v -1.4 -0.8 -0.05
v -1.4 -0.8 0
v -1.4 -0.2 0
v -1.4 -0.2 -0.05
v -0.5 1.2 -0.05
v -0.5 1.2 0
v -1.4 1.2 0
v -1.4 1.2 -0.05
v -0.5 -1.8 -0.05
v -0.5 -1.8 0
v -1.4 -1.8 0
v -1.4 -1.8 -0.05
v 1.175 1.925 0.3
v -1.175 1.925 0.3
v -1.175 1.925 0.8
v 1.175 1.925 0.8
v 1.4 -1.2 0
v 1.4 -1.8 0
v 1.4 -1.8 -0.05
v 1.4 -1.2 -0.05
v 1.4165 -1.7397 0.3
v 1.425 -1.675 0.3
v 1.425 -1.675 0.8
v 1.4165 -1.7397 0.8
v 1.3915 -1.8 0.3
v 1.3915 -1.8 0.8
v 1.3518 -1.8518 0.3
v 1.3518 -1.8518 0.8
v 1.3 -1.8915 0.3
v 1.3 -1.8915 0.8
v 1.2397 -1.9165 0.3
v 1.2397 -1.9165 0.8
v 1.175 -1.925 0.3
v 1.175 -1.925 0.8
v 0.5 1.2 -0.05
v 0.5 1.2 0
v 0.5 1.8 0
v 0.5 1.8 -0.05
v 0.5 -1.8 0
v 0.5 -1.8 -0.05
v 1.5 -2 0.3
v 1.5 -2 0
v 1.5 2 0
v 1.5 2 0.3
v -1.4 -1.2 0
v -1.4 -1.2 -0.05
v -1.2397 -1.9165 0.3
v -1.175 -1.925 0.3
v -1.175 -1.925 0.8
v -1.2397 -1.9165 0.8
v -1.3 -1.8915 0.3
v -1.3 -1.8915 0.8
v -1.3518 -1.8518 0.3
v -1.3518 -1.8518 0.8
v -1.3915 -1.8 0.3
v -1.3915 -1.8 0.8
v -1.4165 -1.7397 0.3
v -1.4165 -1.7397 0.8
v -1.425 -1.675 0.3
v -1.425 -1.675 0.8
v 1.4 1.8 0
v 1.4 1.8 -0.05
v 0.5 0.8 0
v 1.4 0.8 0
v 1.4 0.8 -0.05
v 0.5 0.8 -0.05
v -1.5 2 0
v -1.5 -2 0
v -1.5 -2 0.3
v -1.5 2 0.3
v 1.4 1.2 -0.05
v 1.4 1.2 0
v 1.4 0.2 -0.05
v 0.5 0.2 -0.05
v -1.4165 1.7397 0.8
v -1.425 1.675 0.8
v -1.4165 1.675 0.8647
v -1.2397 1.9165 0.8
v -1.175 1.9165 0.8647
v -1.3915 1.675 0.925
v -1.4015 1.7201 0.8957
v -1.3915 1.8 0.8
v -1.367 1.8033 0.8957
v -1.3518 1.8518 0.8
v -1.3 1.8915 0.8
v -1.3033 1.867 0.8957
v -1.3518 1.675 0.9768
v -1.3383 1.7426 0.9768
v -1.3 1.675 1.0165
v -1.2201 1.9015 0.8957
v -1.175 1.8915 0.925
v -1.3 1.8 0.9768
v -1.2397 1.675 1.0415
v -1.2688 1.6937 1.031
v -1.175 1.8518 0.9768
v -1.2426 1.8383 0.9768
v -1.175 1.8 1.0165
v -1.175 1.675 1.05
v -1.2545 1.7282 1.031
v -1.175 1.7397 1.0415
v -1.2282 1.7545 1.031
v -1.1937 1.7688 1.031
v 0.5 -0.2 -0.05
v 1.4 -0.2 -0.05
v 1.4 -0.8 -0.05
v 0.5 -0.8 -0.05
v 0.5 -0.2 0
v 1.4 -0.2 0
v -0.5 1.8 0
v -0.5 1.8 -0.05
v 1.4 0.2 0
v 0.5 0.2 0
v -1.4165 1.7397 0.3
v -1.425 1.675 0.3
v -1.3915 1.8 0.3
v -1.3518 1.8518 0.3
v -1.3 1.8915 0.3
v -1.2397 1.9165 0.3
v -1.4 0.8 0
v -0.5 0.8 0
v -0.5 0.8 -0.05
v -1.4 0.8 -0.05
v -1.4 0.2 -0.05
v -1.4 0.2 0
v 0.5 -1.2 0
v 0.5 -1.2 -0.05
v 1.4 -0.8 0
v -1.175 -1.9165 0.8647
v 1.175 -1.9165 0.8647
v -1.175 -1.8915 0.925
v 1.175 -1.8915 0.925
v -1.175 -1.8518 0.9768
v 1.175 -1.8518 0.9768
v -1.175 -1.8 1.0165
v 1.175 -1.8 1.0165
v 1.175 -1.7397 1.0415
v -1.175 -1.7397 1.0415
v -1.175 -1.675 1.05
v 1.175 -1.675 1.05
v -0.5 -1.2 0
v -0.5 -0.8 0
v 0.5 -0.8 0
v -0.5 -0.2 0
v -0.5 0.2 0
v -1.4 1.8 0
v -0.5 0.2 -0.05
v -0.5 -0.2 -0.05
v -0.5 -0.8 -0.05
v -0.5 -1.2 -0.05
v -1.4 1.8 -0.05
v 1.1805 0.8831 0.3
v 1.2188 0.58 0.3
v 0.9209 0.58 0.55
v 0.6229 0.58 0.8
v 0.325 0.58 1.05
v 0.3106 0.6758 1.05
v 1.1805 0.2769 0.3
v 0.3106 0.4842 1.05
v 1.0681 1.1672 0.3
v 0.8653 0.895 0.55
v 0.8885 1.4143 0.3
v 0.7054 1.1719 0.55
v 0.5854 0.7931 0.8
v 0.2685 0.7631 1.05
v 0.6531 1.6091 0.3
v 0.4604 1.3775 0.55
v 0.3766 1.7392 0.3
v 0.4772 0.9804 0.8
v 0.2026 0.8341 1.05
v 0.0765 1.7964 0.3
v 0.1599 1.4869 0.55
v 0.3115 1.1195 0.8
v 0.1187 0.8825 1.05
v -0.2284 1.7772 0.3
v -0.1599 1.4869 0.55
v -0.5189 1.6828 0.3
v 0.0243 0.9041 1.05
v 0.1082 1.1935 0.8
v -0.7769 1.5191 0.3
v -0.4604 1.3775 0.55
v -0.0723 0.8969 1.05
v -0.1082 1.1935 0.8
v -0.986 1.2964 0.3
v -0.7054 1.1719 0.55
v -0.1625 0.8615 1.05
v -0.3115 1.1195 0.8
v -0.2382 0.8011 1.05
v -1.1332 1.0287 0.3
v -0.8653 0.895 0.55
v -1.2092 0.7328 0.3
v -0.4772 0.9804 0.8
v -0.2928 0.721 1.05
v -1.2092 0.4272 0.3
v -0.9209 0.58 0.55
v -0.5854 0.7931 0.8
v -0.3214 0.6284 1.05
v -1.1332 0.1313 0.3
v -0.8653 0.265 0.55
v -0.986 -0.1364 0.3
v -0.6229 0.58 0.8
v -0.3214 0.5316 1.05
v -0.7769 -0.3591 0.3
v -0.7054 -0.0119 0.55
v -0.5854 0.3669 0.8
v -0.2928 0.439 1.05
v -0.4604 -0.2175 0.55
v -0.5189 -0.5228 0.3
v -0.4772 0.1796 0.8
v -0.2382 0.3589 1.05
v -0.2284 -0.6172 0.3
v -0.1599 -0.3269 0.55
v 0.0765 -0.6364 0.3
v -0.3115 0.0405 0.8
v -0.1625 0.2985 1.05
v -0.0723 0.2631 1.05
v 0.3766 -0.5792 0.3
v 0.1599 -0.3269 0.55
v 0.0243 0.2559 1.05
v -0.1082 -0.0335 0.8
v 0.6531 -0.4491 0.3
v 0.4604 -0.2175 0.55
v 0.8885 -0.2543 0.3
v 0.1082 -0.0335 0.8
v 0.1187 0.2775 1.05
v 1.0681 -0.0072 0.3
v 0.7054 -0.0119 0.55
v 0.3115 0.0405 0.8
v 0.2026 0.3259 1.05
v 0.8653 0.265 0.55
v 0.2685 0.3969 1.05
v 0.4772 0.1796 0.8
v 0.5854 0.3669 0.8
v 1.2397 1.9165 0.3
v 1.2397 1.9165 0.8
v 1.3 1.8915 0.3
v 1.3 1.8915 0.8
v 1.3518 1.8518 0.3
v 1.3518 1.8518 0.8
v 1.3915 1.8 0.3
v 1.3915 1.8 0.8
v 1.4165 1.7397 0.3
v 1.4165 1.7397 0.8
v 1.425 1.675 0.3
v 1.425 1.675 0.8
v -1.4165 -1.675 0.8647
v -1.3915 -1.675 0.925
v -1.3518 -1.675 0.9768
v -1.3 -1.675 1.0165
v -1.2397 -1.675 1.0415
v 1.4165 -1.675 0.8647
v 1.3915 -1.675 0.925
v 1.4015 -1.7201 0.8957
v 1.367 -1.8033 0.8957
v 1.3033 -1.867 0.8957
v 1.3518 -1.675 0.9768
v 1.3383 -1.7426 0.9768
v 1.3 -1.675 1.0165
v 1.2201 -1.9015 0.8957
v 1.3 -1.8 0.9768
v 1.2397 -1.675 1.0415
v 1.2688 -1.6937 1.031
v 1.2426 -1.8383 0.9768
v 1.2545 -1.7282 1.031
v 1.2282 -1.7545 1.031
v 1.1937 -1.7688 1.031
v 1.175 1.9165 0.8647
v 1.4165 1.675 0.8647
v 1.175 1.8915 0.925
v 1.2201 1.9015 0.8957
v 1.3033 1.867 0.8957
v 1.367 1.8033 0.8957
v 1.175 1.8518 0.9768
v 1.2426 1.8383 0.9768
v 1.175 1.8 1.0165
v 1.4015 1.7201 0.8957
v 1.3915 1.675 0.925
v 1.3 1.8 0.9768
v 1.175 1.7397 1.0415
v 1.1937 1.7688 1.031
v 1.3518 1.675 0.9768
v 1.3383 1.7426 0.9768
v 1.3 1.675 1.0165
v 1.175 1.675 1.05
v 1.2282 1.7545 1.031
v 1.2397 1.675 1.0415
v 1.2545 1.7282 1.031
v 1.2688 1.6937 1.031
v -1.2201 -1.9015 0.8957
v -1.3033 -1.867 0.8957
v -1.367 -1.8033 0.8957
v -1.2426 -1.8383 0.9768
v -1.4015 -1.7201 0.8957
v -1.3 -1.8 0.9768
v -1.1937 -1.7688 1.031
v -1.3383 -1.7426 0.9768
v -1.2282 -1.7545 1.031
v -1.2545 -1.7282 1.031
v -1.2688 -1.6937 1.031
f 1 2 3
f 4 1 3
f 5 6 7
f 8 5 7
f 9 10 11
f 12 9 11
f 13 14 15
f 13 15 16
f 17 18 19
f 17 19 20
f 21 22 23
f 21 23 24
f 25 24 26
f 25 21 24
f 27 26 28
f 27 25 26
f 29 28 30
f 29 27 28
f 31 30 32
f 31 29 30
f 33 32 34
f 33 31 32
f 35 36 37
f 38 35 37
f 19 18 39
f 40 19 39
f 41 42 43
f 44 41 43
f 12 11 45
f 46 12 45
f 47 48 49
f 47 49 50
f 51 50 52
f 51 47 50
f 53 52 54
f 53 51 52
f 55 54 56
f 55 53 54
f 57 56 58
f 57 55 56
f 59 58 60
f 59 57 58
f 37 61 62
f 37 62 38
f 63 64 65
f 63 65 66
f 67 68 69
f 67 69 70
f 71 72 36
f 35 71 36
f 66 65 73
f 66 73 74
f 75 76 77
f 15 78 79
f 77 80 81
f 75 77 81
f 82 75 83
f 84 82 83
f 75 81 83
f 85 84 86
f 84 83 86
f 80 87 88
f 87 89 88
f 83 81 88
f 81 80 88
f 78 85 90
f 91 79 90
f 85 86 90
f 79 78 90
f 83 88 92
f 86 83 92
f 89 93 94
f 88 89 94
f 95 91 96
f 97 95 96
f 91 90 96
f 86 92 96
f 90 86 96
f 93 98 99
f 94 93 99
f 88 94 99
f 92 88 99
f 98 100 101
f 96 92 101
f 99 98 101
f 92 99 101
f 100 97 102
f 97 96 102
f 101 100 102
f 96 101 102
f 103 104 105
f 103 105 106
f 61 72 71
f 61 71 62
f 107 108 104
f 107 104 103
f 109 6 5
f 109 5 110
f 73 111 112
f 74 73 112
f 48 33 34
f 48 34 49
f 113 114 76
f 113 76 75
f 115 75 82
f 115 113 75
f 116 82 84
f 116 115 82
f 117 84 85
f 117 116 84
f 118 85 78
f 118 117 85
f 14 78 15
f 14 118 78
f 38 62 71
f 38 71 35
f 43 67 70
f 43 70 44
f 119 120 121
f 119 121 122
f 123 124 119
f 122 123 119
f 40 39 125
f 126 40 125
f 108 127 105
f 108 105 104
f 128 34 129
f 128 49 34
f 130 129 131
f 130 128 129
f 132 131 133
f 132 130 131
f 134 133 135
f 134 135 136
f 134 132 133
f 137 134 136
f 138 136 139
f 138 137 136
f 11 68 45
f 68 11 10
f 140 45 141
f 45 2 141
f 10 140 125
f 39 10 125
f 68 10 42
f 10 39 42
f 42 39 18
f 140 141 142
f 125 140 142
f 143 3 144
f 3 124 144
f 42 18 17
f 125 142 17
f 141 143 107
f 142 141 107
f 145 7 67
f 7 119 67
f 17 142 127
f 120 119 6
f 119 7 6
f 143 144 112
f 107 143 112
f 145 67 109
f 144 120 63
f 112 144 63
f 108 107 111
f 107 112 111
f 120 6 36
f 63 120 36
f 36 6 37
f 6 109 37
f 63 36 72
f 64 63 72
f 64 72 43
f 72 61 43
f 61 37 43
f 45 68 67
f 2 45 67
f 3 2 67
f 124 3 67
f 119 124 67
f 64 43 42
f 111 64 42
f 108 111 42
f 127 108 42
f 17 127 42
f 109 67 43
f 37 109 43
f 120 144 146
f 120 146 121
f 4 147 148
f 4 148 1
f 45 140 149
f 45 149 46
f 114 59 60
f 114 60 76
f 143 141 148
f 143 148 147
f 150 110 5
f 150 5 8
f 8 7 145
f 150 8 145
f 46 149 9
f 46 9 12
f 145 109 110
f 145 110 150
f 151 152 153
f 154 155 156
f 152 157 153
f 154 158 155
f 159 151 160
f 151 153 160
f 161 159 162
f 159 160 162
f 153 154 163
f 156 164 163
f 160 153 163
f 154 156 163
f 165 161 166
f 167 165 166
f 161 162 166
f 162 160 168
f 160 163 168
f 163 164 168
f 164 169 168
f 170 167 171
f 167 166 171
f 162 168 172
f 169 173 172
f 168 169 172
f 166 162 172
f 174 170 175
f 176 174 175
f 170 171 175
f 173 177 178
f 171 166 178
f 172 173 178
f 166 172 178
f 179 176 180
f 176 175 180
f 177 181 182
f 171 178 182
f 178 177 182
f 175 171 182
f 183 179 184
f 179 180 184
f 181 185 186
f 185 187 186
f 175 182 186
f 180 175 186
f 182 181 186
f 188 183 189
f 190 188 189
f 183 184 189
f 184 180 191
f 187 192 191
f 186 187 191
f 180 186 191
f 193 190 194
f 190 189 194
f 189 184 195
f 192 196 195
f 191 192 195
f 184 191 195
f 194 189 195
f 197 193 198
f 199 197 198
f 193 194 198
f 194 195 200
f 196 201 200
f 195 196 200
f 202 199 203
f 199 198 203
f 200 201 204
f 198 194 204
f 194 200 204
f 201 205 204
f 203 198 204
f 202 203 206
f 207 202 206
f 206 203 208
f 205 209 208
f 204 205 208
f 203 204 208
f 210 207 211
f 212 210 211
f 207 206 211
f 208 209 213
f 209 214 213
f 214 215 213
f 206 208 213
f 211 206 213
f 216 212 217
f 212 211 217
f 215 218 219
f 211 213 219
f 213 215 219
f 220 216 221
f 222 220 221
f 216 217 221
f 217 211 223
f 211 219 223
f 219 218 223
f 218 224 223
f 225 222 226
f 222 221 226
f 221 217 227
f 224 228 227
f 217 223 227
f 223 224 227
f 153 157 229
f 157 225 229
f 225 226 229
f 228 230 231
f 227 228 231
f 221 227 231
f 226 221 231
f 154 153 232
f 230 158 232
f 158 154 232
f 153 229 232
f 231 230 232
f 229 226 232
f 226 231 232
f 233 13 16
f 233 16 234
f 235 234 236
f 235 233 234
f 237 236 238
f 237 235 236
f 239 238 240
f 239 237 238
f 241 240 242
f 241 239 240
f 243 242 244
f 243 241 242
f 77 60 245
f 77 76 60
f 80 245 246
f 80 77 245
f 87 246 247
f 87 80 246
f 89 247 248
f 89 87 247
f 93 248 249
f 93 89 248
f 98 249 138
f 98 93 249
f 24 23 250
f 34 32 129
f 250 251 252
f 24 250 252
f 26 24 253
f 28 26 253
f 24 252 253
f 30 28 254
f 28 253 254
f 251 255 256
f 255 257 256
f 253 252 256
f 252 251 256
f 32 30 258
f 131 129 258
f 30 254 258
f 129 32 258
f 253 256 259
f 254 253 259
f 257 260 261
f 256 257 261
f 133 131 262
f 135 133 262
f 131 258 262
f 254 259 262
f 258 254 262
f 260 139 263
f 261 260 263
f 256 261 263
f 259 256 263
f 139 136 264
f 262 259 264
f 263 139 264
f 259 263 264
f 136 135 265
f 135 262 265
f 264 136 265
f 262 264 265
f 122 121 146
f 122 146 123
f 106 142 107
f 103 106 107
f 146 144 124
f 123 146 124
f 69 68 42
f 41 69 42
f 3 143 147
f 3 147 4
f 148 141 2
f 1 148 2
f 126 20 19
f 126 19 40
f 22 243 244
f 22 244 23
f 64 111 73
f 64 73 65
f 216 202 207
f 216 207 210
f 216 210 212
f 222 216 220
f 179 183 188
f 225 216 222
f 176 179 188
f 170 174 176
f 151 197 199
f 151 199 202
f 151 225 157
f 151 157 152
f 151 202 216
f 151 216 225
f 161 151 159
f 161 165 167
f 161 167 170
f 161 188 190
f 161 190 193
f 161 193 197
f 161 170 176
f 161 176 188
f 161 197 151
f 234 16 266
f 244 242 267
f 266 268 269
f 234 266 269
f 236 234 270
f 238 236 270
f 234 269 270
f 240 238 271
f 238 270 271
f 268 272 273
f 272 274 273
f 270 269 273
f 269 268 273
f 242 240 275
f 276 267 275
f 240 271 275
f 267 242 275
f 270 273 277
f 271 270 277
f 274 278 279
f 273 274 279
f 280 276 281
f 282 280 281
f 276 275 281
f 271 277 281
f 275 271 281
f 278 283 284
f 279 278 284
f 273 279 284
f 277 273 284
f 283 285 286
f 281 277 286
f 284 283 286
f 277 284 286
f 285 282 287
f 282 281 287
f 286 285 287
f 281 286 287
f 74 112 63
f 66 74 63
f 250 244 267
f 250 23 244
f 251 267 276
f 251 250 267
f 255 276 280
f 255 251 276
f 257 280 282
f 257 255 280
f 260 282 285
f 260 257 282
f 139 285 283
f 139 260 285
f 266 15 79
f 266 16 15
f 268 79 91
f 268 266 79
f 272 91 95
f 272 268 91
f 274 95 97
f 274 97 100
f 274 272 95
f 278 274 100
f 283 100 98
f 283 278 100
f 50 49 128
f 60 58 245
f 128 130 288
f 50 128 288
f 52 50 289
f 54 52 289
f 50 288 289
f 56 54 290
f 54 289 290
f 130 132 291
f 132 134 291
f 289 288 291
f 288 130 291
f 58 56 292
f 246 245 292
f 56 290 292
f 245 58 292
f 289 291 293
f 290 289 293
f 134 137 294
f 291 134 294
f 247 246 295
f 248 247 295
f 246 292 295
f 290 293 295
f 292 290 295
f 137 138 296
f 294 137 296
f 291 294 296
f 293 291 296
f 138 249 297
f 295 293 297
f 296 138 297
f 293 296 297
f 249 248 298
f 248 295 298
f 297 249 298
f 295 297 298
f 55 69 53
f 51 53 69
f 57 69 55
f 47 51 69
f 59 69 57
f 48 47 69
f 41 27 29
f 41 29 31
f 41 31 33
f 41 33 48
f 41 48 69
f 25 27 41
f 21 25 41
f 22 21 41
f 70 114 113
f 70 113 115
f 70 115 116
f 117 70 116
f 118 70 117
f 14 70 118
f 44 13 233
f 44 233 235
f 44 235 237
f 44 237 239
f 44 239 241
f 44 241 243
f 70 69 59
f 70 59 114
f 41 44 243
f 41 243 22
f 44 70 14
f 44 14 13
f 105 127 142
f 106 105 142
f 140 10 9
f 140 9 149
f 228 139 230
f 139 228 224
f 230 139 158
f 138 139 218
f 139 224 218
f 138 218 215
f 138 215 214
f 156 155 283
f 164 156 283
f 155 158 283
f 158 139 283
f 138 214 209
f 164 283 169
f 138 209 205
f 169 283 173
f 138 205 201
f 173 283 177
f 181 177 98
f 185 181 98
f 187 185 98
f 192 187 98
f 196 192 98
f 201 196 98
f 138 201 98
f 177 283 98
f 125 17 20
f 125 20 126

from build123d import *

# Parameters (mm, degrees)
SKETCH_1_W          = 3
SKETCH_1_H          = 4
EXTRUDE_1_DEPTH     = 0.3
EXTRUDE_2_DEPTH     = 0.75
FILLET_1_R          = 0.25
SKETCH_3_R          = 0.325
CUT_EXTRUDE_1_DEPTH = 0.75
CUT_EXTRUDE_1_DRAFT = 50
SKETCH_4_W          = 0.9
SKETCH_4_H          = 0.6
EXTRUDE_3_DEPTH     = 0.05


with BuildPart() as part:
    # Эскиз1 → Бобышка-Вытянуть1 (new body)
    with BuildSketch(Plane.XY):
        Rectangle(SKETCH_1_W, SKETCH_1_H)
    extrude(amount=EXTRUDE_1_DEPTH)

    # Эскиз2 → Бобышка-Вытянуть2 (add)
    with BuildSketch(Plane.XY.offset(0.3)):
        with BuildLine():
            Line((-1.175, 1.925), (1.175, 1.925))
            ThreePointArc((1.175, 1.925), (1.351776695, 1.851776695), (1.425, 1.675))
            Line((1.425, 1.675), (1.425, -1.675))
            ThreePointArc((1.425, -1.675), (1.351776695, -1.851776695), (1.175, -1.925))
            Line((1.175, -1.925), (-1.175, -1.925))
            ThreePointArc((-1.175, -1.925), (-1.351776695, -1.851776695), (-1.425, -1.675))
            Line((-1.425, -1.675), (-1.425, 1.675))
            ThreePointArc((-1.425, 1.675), (-1.351776695, 1.851776695), (-1.175, 1.925))
        make_face()
    extrude(amount=EXTRUDE_2_DEPTH)

    # Скругление1
    fillet_1_edges = [part.edges().sort_by_distance(p)[0] for p in [
        (-1.351776695, -1.851776695, 1.05),
        (0, -1.925, 1.05),
        (1.351776695, -1.851776695, 1.05),
        (1.425, 0, 1.05),
        (1.351776695, 1.851776695, 1.05),
        (0, 1.925, 1.05),
        (-1.351776695, 1.851776695, 1.05),
        (-1.425, 0, 1.05),
    ]]
    fillet(fillet_1_edges, radius=FILLET_1_R)


with BuildPart() as cut_extrude_1_tool:
    # Эскиз3 → Вырез-Вытянуть1 (with draft: the straight prism first)
    with BuildSketch(Plane.XY.offset(1.05)):
        with Locations((0, 0.58)):
            Circle(SKETCH_3_R)
    extrude(amount=-CUT_EXTRUDE_1_DEPTH)
    # Вырез-Вытянуть1: the draft: its side faces are tilted about the plane it starts from
    cut_extrude_1_sides = [cut_extrude_1_tool.faces().sort_by_distance(p)[0] for p in [
        (-0.325, 0.58, 0.675),
    ]]
    draft(cut_extrude_1_sides, Plane.XY.offset(1.05), CUT_EXTRUDE_1_DRAFT)


with BuildPart() as part_1:
    add(part.part)

    # Вырез-Вытянуть1: cut by cut_extrude_1_tool
    add(cut_extrude_1_tool.part, mode=Mode.SUBTRACT)

    # Эскиз4 → Бобышка-Вытянуть3 (add)
    with BuildSketch(Plane(origin=(0, 0, 0), x_dir=(-1, 0, 0), z_dir=(0, 0, -1))):
        with Locations((-0.95, -1.5)):
            Rectangle(SKETCH_4_W, SKETCH_4_H)
        with Locations((0.95, -1.5)):
            Rectangle(SKETCH_4_W, SKETCH_4_H)
        with Locations((0.95, -0.5)):
            Rectangle(SKETCH_4_W, SKETCH_4_H)
        with Locations((0.95, 0.5)):
            Rectangle(SKETCH_4_W, SKETCH_4_H)
        with Locations((0.95, 1.5)):
            Rectangle(SKETCH_4_W, SKETCH_4_H)
        with Locations((-0.95, -0.5)):
            Rectangle(SKETCH_4_W, SKETCH_4_H)
        with Locations((-0.95, 0.5)):
            Rectangle(SKETCH_4_W, SKETCH_4_H)
        with Locations((-0.95, 1.5)):
            Rectangle(SKETCH_4_W, SKETCH_4_H)
    extrude(amount=EXTRUDE_3_DEPTH)


solid = part_1.part
